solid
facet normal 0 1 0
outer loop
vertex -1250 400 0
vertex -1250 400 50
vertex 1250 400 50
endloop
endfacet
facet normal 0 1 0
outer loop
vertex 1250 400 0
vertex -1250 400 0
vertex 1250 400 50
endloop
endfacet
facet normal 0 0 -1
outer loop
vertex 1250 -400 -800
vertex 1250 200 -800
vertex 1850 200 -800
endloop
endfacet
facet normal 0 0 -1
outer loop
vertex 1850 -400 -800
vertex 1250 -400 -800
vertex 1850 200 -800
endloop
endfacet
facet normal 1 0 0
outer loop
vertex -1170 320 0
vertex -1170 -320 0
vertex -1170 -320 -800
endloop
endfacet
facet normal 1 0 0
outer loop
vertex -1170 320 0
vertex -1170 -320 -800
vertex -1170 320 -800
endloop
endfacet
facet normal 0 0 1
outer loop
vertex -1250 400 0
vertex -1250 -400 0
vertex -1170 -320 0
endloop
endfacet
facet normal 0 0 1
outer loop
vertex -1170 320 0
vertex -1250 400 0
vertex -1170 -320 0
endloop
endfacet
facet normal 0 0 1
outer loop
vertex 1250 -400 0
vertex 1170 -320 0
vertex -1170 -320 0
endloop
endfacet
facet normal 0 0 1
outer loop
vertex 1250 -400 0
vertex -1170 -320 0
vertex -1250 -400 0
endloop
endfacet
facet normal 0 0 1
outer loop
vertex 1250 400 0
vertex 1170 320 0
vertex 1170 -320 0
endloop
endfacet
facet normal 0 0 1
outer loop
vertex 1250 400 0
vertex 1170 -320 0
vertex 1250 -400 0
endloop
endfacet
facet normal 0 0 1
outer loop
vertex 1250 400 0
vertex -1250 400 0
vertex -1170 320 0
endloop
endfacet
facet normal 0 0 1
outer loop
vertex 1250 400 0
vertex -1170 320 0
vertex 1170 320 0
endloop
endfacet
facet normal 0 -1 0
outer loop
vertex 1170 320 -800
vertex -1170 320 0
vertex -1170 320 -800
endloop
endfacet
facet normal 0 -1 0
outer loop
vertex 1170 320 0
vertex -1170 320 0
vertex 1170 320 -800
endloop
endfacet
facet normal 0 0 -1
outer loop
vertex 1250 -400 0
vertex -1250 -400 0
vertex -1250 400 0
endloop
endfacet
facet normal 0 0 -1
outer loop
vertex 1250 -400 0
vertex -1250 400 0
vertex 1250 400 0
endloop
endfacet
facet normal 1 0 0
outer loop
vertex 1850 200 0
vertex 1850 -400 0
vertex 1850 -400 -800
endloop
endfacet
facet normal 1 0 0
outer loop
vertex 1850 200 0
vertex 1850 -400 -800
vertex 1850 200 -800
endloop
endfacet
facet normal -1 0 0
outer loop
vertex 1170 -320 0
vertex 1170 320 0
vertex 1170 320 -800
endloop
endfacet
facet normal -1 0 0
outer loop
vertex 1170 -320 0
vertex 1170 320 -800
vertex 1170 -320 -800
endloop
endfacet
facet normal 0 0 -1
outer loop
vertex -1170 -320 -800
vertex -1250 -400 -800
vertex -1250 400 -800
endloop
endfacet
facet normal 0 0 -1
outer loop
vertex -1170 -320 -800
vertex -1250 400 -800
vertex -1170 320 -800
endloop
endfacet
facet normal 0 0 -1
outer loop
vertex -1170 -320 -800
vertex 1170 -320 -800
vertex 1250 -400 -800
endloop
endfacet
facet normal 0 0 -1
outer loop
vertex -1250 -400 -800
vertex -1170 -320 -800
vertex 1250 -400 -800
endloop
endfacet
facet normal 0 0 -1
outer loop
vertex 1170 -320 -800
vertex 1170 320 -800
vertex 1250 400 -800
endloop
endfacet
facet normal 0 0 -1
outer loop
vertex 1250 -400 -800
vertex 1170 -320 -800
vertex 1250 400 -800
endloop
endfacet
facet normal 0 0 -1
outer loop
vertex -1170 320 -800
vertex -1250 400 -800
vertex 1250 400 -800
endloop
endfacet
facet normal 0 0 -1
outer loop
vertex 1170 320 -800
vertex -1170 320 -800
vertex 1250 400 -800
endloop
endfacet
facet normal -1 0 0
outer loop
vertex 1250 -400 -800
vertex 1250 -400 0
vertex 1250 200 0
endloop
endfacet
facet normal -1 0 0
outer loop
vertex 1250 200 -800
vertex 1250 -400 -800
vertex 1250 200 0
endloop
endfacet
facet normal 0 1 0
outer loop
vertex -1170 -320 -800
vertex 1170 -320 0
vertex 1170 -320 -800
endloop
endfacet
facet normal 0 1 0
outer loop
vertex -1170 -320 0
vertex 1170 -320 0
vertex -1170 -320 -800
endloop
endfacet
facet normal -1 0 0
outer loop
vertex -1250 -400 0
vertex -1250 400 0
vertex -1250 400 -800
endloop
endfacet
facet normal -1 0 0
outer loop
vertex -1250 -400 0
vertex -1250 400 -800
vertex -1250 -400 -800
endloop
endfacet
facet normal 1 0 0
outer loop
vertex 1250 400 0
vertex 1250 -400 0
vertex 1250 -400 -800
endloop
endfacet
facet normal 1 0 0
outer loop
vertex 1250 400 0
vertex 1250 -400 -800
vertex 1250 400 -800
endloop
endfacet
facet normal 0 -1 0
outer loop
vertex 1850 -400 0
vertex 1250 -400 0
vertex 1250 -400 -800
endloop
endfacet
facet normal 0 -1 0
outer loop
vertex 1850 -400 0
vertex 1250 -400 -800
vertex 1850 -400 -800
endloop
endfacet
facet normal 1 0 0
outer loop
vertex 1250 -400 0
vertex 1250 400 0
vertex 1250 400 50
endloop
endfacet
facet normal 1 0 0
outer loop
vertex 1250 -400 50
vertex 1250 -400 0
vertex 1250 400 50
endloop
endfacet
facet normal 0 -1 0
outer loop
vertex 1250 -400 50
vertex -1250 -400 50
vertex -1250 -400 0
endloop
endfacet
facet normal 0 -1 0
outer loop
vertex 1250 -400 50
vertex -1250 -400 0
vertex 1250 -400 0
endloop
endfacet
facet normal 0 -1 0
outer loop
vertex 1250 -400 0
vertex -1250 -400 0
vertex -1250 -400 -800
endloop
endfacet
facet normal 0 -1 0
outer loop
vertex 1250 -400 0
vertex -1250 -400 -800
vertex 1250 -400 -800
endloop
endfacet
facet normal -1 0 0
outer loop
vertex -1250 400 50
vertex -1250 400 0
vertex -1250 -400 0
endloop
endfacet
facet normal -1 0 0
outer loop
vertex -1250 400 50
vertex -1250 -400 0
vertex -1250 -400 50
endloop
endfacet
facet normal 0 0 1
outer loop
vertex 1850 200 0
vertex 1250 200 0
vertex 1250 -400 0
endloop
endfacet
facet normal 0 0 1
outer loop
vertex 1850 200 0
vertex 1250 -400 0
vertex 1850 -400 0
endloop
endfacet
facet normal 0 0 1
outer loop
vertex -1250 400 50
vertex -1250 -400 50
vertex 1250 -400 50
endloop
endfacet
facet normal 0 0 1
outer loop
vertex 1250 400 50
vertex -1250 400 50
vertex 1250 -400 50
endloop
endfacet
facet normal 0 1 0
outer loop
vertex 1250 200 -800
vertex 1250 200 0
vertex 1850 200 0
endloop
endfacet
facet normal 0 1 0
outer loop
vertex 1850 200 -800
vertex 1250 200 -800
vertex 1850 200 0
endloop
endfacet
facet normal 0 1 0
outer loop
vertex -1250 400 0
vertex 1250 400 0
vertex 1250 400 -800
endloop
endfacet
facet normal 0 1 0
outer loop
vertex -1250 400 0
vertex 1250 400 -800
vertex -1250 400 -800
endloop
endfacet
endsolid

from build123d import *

# Parameters (mm, degrees)
F0_W     = 900
F0_H     = 80
F1_DEPTH = 800
F2_W     = 2500
F2_H     = 50
F3_DEPTH = 800
F0_W_2   = 600
F0_H_2   = 600
F4_DEPTH = 800


with BuildPart() as f1:
    # F0 (on Top) → F1 (new body)
    with BuildSketch(Plane.XY):
        Polygon((-450, 400), (-1250, 400), (-1250, -400), (-450, -400), (-450, -320), (-1170, -320), (-1170, 320), (-450, 320), align=None)
        with Locations((0, 360)):
            Rectangle(F0_W, F0_H)
        Polygon((1250, 400), (450, 400), (450, 320), (1170, 320), (1170, -320), (450, -320), (450, -400), (1250, -400), (1250, 200), align=None)
        with Locations((0, -360)):
            Rectangle(F0_W, F0_H)
    extrude(amount=-F1_DEPTH)


with BuildPart() as f3:
    # F2 (on face) → F3 (new body)
    with BuildSketch(Plane.XZ.offset(400)):
        with Locations((0, 25)):
            Rectangle(F2_W, F2_H)
    extrude(amount=-F3_DEPTH)


with BuildPart() as f4:
    # F0 (on Top) → F4 (new body)
    with BuildSketch(Plane.XY):
        with Locations((1550, -100)):
            Rectangle(F0_W_2, F0_H_2)
    extrude(amount=-F4_DEPTH)


solid = Compound([f1.part, f3.part, f4.part])
